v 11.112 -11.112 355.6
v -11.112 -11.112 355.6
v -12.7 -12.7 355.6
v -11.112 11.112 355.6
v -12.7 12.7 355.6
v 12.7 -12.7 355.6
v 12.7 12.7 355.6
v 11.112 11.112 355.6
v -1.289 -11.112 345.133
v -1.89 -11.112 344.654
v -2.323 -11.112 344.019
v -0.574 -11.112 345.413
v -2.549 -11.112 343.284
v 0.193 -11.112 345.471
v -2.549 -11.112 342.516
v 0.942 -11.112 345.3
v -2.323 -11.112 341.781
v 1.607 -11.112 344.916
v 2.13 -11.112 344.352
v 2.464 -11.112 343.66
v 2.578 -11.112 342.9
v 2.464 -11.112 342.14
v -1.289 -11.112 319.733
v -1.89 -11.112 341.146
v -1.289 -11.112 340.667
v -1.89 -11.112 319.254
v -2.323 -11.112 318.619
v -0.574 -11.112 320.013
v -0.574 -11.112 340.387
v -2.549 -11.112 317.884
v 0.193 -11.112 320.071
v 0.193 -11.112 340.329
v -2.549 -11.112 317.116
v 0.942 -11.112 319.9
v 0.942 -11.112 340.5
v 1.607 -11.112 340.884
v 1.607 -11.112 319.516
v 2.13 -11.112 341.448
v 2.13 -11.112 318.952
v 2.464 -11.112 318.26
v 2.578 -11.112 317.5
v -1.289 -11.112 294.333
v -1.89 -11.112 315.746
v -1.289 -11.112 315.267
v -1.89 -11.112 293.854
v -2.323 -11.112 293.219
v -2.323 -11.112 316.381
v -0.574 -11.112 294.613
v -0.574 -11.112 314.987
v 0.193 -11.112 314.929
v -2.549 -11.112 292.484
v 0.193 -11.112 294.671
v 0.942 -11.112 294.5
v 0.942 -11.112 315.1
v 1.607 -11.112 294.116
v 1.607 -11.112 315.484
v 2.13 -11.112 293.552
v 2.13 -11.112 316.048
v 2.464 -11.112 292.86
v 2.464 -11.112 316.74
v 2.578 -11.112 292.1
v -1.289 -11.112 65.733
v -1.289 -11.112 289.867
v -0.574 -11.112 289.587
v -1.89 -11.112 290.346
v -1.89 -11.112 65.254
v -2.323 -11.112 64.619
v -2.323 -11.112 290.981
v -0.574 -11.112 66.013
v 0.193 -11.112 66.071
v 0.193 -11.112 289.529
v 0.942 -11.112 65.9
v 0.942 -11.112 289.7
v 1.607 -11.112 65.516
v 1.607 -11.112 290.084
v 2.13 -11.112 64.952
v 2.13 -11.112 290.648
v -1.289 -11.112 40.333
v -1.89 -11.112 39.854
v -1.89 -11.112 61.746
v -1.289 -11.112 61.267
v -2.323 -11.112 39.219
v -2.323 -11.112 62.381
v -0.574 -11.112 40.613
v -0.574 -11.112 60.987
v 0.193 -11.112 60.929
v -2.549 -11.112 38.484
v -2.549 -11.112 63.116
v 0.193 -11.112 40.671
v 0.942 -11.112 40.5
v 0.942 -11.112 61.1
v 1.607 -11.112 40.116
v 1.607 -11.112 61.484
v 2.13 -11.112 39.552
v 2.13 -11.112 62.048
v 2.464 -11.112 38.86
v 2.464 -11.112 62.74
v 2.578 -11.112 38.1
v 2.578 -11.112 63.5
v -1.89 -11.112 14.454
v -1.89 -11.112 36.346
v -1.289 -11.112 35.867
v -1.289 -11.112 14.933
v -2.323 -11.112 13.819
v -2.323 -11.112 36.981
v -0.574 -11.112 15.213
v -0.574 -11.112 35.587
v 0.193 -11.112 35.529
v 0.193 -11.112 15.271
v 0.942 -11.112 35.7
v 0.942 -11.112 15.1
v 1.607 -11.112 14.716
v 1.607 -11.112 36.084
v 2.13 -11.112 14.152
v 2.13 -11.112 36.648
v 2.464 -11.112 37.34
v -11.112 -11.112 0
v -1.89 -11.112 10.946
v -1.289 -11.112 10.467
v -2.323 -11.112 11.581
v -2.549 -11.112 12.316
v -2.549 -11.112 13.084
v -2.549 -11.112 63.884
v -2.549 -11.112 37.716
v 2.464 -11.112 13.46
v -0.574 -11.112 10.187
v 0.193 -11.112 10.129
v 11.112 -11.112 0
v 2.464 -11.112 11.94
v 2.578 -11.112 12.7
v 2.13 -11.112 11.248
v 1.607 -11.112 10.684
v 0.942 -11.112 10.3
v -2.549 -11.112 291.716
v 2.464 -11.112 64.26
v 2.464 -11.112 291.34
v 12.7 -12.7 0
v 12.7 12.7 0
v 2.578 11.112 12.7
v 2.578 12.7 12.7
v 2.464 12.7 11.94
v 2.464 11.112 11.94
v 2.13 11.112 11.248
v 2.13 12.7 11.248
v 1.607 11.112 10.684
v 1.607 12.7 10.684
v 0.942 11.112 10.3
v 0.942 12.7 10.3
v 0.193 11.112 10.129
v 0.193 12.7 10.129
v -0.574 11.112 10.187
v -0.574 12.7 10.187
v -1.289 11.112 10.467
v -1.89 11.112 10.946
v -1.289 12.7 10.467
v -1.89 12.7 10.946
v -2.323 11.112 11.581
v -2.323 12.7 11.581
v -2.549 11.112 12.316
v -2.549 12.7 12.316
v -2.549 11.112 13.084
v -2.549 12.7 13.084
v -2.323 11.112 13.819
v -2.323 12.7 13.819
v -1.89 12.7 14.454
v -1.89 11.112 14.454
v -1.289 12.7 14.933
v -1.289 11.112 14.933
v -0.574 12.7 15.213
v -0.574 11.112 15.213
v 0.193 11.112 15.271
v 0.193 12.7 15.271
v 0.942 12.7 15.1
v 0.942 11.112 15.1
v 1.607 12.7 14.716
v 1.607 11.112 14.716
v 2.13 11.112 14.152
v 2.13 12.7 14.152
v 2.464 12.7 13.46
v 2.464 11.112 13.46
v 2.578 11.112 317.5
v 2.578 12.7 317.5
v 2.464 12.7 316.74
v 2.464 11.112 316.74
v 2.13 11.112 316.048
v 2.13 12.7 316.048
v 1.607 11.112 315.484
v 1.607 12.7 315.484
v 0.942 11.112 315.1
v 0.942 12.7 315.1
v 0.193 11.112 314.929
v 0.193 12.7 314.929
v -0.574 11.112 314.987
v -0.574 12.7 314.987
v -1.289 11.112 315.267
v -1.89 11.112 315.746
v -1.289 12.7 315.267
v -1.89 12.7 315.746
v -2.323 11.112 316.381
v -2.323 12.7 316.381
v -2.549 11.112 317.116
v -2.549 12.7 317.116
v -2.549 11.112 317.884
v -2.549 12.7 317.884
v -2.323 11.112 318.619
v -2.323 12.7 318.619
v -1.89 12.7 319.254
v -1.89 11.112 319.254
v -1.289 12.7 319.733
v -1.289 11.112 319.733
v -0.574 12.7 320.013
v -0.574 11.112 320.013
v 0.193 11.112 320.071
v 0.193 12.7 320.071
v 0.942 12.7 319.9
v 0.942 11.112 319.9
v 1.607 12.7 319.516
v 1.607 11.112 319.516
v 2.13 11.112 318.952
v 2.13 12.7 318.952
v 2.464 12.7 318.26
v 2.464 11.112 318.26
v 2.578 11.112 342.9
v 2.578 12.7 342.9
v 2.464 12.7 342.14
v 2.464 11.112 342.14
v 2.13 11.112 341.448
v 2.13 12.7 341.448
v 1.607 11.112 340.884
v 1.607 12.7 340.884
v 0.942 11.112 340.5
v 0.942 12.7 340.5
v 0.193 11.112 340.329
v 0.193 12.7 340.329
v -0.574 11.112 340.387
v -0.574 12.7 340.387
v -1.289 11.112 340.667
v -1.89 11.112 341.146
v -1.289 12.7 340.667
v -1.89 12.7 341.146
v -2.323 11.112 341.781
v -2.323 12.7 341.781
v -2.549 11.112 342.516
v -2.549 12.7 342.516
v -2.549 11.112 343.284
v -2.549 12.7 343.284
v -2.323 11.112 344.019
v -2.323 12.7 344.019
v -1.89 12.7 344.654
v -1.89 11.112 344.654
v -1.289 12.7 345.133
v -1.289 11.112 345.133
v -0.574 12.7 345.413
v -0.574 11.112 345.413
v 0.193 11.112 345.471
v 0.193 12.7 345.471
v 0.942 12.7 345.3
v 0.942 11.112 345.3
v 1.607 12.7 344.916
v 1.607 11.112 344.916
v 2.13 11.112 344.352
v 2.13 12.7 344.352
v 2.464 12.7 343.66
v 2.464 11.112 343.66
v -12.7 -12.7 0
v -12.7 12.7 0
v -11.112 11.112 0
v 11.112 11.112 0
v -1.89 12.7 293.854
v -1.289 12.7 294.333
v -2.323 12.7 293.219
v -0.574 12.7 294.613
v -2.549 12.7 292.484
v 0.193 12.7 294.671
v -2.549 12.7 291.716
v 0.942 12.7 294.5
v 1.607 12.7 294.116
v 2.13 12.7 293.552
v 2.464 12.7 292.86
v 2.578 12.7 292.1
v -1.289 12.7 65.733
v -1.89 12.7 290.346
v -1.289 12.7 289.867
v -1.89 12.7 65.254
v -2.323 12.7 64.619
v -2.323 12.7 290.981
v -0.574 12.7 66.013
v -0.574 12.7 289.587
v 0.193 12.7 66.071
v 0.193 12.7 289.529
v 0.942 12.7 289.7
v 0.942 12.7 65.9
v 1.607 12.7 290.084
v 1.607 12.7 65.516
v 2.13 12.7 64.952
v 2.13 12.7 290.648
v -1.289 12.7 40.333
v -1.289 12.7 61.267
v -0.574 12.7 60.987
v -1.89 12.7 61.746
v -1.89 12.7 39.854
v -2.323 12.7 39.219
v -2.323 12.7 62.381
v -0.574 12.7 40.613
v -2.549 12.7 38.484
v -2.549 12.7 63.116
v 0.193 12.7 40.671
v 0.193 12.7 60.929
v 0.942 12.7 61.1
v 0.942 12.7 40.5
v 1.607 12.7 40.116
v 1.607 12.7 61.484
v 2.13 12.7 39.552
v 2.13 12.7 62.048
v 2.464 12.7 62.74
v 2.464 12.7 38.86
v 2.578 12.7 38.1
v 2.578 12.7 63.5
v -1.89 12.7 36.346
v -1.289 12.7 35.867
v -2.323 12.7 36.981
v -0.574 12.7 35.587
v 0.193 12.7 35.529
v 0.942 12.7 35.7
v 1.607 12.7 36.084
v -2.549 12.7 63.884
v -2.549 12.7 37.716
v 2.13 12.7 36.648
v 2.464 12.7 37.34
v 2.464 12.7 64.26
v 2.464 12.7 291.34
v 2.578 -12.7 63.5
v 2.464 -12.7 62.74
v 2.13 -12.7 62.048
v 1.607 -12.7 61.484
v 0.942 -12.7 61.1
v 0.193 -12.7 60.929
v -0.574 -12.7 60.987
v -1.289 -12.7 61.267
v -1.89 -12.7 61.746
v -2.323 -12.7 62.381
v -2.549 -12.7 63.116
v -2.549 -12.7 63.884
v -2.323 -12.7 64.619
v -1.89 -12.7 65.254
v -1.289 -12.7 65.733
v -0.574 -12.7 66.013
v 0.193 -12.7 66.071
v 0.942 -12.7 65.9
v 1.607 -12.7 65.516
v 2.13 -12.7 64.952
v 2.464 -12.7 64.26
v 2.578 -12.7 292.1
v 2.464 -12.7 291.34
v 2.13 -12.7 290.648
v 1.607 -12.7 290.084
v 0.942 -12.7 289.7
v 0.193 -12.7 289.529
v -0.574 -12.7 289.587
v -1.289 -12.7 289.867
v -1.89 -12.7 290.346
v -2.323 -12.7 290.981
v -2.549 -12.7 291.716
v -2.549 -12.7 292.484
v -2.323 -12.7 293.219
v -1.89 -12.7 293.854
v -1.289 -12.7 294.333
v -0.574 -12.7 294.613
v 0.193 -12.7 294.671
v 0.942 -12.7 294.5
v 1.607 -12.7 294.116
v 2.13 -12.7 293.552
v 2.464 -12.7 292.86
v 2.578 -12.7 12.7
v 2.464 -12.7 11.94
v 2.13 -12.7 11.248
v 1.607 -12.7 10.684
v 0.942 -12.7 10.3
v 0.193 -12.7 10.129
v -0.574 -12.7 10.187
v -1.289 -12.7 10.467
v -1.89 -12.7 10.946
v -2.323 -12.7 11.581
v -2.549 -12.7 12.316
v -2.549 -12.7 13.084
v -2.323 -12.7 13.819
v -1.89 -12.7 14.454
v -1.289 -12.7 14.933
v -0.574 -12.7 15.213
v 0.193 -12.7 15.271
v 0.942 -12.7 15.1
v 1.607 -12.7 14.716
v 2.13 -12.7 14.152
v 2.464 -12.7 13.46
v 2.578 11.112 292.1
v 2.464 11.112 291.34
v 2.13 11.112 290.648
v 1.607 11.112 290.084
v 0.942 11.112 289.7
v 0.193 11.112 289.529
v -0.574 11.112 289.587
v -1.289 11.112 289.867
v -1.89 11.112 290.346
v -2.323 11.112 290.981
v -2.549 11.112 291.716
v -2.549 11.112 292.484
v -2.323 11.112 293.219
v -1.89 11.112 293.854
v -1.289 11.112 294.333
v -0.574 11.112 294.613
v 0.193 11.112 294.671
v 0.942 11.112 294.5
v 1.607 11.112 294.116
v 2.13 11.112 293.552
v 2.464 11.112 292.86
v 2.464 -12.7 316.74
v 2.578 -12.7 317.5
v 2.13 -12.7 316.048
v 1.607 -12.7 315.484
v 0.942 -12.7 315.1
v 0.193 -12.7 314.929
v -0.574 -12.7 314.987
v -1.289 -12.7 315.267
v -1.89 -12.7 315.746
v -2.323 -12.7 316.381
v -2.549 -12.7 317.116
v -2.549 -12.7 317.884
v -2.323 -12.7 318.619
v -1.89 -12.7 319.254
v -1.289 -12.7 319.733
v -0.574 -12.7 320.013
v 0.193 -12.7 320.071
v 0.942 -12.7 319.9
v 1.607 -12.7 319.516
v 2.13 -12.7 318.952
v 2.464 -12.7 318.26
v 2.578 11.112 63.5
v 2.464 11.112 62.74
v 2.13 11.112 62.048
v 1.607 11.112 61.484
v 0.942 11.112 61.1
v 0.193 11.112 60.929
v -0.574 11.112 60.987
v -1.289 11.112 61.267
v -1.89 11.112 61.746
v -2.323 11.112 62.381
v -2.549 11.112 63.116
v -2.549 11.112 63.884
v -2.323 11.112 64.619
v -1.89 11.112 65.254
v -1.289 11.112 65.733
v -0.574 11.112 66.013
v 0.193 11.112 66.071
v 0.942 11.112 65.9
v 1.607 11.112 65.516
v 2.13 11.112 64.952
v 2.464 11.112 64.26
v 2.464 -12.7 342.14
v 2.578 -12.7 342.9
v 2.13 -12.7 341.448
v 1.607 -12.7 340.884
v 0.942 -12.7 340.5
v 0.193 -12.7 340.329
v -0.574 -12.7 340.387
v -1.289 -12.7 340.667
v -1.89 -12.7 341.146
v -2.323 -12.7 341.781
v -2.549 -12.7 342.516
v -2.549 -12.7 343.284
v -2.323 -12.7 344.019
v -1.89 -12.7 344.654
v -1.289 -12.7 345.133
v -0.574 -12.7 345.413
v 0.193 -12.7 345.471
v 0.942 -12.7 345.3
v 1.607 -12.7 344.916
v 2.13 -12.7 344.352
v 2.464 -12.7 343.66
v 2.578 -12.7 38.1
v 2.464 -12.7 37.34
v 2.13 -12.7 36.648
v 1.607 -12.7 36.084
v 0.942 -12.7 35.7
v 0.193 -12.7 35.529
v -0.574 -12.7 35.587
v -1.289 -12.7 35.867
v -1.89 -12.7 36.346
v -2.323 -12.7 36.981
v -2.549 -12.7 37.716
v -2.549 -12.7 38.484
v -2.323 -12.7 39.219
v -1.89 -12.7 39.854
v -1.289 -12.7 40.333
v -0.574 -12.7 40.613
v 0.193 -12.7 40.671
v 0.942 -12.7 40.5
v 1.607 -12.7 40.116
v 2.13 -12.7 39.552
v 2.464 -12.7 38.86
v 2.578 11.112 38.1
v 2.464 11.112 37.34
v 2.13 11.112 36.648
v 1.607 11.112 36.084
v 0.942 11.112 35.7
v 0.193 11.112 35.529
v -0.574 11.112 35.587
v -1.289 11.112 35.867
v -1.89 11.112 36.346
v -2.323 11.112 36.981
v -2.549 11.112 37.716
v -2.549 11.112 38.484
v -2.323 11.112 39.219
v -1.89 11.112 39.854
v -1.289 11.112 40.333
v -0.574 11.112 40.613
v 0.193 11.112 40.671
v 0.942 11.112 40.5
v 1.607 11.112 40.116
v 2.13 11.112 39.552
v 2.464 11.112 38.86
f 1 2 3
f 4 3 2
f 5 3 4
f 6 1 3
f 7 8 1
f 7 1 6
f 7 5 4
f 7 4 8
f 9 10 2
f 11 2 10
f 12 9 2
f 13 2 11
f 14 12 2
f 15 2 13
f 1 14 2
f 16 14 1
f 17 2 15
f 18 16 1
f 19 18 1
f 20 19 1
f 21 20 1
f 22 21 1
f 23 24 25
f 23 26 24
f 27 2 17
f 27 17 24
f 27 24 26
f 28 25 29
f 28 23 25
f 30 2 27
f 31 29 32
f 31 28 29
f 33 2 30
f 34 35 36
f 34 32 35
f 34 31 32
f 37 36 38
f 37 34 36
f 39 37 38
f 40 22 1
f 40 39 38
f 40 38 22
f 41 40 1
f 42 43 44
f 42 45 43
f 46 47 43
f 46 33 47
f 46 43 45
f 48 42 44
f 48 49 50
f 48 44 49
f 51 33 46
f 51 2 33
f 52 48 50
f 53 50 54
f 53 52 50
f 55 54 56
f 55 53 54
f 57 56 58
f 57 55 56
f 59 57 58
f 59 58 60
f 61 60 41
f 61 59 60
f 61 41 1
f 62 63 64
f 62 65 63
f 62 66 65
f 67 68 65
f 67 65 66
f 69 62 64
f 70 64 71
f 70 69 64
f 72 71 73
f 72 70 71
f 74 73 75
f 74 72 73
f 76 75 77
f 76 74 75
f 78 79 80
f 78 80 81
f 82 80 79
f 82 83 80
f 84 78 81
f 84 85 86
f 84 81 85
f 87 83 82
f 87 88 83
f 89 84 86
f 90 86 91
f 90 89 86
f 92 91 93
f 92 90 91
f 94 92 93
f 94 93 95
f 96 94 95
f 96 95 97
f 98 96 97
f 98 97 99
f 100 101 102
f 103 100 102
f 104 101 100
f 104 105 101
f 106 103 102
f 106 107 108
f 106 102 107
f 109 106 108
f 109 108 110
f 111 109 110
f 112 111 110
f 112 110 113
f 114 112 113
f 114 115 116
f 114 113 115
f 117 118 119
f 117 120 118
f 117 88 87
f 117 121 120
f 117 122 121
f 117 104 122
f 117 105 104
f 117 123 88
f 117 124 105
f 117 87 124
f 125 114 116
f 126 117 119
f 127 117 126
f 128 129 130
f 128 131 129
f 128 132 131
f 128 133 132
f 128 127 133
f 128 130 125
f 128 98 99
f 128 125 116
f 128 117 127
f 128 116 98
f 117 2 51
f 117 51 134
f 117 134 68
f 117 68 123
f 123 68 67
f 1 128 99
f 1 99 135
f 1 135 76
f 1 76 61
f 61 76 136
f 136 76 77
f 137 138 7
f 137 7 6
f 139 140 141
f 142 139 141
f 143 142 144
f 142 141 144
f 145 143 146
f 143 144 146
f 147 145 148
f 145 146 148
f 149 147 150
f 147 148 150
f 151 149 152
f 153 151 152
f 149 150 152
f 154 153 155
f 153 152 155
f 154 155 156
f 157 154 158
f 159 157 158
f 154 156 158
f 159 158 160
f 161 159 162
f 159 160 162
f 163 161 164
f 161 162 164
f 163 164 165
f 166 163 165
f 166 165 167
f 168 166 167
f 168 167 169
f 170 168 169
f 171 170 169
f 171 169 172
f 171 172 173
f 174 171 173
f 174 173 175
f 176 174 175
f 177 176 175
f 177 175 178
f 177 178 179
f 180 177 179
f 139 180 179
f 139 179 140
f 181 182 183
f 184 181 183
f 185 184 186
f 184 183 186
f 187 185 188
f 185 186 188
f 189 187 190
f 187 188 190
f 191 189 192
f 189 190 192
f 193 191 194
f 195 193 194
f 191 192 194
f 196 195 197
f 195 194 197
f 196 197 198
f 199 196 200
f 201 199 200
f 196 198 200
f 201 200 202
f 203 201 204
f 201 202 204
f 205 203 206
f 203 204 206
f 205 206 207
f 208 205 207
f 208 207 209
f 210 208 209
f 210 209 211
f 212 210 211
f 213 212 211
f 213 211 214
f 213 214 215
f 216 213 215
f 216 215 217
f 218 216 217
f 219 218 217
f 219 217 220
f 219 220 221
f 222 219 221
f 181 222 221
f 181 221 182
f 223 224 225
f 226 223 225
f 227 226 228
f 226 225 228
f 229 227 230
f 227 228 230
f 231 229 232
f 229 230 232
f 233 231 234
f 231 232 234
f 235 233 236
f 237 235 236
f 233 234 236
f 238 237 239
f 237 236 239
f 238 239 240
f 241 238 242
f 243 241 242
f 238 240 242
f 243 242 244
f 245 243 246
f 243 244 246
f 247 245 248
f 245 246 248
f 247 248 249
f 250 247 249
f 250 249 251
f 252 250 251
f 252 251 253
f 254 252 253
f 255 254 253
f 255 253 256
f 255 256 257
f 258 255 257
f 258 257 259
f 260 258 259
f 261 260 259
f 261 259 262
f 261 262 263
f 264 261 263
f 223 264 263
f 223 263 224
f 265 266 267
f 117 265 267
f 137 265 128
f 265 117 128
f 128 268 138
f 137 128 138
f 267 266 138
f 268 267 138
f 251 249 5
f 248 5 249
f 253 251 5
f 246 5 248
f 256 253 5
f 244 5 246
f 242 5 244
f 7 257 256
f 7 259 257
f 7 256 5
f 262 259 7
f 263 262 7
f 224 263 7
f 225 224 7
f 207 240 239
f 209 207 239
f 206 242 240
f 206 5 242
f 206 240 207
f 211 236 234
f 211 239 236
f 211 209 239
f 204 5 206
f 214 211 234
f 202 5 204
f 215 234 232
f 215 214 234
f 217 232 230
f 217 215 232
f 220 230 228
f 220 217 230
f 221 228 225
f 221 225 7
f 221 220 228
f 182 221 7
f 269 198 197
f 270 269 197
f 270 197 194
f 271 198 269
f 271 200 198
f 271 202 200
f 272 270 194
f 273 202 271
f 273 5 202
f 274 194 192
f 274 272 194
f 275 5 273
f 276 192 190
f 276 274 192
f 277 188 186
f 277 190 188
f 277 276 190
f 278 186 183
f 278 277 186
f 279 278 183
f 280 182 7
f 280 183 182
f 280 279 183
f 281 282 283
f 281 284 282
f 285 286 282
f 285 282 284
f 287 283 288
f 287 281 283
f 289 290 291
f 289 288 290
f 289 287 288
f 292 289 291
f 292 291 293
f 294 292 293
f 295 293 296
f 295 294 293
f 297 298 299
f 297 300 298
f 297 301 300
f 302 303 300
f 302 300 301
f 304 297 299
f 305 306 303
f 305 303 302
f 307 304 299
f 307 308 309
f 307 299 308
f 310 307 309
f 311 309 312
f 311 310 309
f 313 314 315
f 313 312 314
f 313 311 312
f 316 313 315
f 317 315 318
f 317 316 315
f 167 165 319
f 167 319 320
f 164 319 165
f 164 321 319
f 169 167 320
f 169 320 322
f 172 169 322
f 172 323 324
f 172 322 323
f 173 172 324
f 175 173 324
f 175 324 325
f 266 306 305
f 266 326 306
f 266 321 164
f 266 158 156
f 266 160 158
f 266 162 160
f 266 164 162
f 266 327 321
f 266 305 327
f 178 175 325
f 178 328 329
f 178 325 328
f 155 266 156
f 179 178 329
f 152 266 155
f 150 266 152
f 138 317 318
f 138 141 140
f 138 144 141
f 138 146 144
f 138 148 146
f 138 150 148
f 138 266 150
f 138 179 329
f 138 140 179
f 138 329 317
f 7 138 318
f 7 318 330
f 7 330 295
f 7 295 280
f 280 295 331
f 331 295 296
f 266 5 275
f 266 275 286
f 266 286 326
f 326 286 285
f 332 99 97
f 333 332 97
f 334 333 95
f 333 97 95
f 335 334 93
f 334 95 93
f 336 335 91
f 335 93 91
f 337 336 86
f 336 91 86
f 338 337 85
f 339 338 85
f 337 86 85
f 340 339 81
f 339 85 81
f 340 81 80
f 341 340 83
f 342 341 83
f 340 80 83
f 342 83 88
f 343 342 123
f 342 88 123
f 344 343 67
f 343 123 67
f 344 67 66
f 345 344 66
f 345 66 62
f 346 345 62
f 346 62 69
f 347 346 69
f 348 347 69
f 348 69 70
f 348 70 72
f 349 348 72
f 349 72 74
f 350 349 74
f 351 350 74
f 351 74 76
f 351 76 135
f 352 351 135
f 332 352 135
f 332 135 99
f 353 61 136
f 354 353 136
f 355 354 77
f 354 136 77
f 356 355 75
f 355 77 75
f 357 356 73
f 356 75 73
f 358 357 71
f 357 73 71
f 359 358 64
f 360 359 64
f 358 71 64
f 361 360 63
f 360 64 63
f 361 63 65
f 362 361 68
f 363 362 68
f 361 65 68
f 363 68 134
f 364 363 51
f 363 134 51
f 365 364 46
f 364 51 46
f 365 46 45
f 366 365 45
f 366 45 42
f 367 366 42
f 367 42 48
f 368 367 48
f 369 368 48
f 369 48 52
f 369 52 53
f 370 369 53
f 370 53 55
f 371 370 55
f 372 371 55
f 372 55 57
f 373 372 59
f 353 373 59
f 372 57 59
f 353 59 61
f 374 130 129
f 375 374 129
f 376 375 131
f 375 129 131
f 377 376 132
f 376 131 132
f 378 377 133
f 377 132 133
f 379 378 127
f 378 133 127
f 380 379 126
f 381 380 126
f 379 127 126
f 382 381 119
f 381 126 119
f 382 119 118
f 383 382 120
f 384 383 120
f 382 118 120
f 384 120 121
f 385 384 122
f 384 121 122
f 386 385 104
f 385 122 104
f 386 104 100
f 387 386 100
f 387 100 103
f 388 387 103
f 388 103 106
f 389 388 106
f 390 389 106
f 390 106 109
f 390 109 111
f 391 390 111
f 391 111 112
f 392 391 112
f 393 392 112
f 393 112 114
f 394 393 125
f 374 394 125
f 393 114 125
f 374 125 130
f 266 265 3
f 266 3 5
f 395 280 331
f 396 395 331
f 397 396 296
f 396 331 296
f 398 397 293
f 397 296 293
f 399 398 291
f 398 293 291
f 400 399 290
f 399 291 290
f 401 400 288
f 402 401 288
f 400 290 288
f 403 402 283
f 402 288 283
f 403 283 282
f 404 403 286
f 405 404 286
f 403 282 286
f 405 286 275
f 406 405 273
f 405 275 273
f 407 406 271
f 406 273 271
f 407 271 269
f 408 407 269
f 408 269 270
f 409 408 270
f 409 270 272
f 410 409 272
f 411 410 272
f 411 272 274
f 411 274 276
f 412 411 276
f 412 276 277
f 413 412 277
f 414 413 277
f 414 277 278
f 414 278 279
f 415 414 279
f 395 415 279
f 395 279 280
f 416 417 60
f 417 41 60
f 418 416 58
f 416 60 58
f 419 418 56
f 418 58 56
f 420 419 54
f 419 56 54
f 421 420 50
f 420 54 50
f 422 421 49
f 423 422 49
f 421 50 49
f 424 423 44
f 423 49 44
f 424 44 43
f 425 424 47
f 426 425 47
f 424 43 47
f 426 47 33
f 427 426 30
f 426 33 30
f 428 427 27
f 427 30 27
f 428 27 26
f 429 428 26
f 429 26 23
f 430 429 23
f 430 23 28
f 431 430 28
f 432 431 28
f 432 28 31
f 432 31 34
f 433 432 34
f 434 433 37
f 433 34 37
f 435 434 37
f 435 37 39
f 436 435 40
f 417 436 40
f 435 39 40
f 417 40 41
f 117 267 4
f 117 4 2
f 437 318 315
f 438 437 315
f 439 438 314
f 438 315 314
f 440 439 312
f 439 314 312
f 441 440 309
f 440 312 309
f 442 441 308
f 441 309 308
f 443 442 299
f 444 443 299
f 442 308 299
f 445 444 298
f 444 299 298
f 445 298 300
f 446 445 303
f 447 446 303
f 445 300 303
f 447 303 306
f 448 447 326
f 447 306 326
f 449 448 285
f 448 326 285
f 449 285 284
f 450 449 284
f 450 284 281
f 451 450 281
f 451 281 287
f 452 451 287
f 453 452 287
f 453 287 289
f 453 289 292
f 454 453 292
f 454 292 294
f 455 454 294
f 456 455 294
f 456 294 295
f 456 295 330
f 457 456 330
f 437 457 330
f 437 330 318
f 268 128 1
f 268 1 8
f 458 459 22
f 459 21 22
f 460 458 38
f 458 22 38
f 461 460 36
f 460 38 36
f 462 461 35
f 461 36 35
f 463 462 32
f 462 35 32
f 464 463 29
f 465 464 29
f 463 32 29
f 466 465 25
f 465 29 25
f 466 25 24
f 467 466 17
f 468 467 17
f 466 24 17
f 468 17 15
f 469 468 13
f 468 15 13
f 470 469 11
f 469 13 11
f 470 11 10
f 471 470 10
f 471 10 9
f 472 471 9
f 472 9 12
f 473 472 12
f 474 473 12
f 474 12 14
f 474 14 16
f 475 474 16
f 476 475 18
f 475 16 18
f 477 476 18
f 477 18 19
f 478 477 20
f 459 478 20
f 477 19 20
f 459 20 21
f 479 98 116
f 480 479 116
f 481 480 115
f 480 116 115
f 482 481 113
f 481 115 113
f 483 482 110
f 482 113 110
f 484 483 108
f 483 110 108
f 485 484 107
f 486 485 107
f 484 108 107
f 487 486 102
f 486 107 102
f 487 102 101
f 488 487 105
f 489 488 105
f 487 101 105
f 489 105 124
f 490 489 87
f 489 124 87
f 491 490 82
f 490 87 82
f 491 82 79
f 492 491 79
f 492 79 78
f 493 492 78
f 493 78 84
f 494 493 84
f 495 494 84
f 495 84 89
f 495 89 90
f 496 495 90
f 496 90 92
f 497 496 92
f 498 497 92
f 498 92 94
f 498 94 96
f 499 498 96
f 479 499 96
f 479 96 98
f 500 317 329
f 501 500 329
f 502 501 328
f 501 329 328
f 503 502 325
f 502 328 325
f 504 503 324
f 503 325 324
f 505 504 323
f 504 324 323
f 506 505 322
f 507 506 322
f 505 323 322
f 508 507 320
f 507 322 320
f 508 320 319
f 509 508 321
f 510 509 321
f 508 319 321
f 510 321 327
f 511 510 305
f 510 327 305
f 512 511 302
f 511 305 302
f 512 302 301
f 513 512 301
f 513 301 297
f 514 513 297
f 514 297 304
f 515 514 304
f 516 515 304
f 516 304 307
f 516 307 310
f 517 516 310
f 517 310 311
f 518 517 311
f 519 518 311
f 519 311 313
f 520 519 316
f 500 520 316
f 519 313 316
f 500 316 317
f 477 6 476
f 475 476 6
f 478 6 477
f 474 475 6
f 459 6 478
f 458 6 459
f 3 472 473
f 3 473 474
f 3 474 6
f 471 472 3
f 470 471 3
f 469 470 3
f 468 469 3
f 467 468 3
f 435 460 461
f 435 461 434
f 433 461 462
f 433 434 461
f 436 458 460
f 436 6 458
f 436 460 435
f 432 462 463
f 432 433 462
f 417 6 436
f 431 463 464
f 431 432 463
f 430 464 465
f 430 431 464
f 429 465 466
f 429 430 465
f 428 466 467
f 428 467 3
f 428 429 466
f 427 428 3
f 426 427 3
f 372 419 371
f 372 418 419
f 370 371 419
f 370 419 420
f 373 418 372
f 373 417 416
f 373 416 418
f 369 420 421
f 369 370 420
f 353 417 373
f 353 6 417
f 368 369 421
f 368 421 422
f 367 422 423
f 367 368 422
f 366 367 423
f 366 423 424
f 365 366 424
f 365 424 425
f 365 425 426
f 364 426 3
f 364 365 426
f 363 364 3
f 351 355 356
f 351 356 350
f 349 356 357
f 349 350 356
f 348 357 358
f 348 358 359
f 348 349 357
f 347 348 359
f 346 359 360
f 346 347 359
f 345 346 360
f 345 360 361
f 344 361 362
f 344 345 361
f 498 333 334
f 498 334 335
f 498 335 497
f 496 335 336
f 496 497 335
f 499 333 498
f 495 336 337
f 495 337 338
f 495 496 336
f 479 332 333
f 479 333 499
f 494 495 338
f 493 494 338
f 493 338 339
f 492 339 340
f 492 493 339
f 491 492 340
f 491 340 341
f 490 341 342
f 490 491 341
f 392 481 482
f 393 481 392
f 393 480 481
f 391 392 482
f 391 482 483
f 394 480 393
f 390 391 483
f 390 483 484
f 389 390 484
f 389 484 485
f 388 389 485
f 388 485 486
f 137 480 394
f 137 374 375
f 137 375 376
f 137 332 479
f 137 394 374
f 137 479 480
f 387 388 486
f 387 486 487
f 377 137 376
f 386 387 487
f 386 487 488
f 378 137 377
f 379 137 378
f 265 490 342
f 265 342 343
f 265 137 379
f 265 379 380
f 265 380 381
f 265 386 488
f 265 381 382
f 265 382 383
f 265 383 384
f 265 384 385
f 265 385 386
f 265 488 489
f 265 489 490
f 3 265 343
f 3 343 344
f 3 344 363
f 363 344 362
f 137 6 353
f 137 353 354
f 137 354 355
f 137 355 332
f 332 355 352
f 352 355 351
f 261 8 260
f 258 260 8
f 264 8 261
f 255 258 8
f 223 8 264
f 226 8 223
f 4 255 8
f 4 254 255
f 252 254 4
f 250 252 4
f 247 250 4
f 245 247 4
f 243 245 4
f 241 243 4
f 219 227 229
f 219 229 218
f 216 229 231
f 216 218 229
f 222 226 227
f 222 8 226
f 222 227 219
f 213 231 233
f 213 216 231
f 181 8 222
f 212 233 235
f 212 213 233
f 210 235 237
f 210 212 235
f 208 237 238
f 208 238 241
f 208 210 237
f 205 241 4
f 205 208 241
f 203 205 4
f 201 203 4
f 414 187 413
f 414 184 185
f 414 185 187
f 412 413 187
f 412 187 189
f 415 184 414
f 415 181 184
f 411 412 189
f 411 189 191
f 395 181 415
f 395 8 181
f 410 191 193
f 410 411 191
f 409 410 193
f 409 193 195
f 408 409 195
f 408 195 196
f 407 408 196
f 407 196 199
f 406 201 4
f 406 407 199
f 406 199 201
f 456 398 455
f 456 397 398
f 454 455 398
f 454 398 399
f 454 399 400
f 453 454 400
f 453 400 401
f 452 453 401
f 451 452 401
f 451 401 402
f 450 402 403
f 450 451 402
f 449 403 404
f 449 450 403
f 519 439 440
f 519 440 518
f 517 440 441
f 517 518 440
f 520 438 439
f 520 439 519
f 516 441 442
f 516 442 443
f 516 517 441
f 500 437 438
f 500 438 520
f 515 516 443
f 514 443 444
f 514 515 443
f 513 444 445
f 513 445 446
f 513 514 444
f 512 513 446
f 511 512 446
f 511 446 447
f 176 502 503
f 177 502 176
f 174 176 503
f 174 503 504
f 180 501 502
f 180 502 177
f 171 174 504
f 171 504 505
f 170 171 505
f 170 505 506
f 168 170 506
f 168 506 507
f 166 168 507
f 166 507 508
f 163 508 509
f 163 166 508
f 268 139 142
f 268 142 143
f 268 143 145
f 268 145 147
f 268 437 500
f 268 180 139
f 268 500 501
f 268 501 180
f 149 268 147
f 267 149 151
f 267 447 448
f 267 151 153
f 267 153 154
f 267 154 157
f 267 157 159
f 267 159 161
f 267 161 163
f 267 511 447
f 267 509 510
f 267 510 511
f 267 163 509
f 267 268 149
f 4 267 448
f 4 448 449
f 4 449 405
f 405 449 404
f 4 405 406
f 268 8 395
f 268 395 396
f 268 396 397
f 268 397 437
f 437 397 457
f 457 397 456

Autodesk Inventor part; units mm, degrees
ref_plane "YZ Plane" through (0, 0, 0) normal (1, 0, 0) x (0, 1, 0)
ref_plane "XZ Plane" through (0, 0, 0) normal (0, 1, 0) x (-1, 0, 0)
ref_plane "XY Plane" through (0, 0, 0) normal (0, 0, 1) x (1, 0, 0)
sketch "Sketch1" plane through (0, 0, 0) normal (0, 0, 1) x (1, 0, 0)
  line L0 (-12.7, -12.7) -> (-12.7, 12.7)
  line L1 (-12.7, 12.7) -> (12.7, 12.7)
  line L2 (12.7, 12.7) -> (12.7, -12.7)
  line L3 (12.7, -12.7) -> (-12.7, -12.7)
  line L4 (-12.7, -12.7) -> (12.7, 12.7) construction
  line L5 (-12.7, 12.7) -> (12.7, -12.7) construction
  line L6 (11.1125, 11.1125) -> (-11.1125, 11.1125)
  line L7 (-11.1125, 11.1125) -> (-11.1125, -11.1125)
  line L8 (-11.1125, -11.1125) -> (11.1125, -11.1125)
  line L9 (11.1125, -11.1125) -> (11.1125, 11.1125)
  point P0 (0, 0)
  dimension "d0" = 25.4
  dimension "d1" = 25.4
  dimension "d2" = 1.5875
extrude "Extrusion1" add sketch "Sketch1" along normal blind 355.6
sketch "Sketch2" plane through (-12.7, 12.7, 0) normal (0, 1, 0) x (1, 0, 0)
  line L0 (25.4, 0) -> (0, 0) projected
  line L1 (0, 0) -> (0, -355.6) projected
  line L2 (25.4, -355.6) -> (0, -355.6) projected
  line L3 (25.4, 0) -> (25.4, -355.6) projected
  circle A0 centre (12.7, -12.7) radius 2.5781
  circle A1 centre (12.7, -38.1) radius 2.5781
  circle A2 centre (12.7, -63.5) radius 2.5781
  line L4 (1.5875, 0) -> (1.5875, -355.6) construction
  line L5 (1.5875, -177.8) -> (25.4, -177.8) construction
  circle A3 centre (12.7, -342.9) radius 2.5781
  circle A4 centre (12.7, -317.5) radius 2.5781
  circle A5 centre (12.7, -292.1) radius 2.5781
  point P0 (12.7, 0)
  dimension "d5" = 5.1562
  dimension "d6" = 5.1562
  dimension "d7" = 12.7
  dimension "d8" = 25.4
  dimension "d9" = 25.4
  dimension "d10" = 12.7
extrude "Extrusion2" cut sketch "Sketch2" against normal through all contours A0 | A1 | A2 | A3 | A4 | A5
equation "\"d1\" = d0"
properties part number "14in long 1in square tube"
